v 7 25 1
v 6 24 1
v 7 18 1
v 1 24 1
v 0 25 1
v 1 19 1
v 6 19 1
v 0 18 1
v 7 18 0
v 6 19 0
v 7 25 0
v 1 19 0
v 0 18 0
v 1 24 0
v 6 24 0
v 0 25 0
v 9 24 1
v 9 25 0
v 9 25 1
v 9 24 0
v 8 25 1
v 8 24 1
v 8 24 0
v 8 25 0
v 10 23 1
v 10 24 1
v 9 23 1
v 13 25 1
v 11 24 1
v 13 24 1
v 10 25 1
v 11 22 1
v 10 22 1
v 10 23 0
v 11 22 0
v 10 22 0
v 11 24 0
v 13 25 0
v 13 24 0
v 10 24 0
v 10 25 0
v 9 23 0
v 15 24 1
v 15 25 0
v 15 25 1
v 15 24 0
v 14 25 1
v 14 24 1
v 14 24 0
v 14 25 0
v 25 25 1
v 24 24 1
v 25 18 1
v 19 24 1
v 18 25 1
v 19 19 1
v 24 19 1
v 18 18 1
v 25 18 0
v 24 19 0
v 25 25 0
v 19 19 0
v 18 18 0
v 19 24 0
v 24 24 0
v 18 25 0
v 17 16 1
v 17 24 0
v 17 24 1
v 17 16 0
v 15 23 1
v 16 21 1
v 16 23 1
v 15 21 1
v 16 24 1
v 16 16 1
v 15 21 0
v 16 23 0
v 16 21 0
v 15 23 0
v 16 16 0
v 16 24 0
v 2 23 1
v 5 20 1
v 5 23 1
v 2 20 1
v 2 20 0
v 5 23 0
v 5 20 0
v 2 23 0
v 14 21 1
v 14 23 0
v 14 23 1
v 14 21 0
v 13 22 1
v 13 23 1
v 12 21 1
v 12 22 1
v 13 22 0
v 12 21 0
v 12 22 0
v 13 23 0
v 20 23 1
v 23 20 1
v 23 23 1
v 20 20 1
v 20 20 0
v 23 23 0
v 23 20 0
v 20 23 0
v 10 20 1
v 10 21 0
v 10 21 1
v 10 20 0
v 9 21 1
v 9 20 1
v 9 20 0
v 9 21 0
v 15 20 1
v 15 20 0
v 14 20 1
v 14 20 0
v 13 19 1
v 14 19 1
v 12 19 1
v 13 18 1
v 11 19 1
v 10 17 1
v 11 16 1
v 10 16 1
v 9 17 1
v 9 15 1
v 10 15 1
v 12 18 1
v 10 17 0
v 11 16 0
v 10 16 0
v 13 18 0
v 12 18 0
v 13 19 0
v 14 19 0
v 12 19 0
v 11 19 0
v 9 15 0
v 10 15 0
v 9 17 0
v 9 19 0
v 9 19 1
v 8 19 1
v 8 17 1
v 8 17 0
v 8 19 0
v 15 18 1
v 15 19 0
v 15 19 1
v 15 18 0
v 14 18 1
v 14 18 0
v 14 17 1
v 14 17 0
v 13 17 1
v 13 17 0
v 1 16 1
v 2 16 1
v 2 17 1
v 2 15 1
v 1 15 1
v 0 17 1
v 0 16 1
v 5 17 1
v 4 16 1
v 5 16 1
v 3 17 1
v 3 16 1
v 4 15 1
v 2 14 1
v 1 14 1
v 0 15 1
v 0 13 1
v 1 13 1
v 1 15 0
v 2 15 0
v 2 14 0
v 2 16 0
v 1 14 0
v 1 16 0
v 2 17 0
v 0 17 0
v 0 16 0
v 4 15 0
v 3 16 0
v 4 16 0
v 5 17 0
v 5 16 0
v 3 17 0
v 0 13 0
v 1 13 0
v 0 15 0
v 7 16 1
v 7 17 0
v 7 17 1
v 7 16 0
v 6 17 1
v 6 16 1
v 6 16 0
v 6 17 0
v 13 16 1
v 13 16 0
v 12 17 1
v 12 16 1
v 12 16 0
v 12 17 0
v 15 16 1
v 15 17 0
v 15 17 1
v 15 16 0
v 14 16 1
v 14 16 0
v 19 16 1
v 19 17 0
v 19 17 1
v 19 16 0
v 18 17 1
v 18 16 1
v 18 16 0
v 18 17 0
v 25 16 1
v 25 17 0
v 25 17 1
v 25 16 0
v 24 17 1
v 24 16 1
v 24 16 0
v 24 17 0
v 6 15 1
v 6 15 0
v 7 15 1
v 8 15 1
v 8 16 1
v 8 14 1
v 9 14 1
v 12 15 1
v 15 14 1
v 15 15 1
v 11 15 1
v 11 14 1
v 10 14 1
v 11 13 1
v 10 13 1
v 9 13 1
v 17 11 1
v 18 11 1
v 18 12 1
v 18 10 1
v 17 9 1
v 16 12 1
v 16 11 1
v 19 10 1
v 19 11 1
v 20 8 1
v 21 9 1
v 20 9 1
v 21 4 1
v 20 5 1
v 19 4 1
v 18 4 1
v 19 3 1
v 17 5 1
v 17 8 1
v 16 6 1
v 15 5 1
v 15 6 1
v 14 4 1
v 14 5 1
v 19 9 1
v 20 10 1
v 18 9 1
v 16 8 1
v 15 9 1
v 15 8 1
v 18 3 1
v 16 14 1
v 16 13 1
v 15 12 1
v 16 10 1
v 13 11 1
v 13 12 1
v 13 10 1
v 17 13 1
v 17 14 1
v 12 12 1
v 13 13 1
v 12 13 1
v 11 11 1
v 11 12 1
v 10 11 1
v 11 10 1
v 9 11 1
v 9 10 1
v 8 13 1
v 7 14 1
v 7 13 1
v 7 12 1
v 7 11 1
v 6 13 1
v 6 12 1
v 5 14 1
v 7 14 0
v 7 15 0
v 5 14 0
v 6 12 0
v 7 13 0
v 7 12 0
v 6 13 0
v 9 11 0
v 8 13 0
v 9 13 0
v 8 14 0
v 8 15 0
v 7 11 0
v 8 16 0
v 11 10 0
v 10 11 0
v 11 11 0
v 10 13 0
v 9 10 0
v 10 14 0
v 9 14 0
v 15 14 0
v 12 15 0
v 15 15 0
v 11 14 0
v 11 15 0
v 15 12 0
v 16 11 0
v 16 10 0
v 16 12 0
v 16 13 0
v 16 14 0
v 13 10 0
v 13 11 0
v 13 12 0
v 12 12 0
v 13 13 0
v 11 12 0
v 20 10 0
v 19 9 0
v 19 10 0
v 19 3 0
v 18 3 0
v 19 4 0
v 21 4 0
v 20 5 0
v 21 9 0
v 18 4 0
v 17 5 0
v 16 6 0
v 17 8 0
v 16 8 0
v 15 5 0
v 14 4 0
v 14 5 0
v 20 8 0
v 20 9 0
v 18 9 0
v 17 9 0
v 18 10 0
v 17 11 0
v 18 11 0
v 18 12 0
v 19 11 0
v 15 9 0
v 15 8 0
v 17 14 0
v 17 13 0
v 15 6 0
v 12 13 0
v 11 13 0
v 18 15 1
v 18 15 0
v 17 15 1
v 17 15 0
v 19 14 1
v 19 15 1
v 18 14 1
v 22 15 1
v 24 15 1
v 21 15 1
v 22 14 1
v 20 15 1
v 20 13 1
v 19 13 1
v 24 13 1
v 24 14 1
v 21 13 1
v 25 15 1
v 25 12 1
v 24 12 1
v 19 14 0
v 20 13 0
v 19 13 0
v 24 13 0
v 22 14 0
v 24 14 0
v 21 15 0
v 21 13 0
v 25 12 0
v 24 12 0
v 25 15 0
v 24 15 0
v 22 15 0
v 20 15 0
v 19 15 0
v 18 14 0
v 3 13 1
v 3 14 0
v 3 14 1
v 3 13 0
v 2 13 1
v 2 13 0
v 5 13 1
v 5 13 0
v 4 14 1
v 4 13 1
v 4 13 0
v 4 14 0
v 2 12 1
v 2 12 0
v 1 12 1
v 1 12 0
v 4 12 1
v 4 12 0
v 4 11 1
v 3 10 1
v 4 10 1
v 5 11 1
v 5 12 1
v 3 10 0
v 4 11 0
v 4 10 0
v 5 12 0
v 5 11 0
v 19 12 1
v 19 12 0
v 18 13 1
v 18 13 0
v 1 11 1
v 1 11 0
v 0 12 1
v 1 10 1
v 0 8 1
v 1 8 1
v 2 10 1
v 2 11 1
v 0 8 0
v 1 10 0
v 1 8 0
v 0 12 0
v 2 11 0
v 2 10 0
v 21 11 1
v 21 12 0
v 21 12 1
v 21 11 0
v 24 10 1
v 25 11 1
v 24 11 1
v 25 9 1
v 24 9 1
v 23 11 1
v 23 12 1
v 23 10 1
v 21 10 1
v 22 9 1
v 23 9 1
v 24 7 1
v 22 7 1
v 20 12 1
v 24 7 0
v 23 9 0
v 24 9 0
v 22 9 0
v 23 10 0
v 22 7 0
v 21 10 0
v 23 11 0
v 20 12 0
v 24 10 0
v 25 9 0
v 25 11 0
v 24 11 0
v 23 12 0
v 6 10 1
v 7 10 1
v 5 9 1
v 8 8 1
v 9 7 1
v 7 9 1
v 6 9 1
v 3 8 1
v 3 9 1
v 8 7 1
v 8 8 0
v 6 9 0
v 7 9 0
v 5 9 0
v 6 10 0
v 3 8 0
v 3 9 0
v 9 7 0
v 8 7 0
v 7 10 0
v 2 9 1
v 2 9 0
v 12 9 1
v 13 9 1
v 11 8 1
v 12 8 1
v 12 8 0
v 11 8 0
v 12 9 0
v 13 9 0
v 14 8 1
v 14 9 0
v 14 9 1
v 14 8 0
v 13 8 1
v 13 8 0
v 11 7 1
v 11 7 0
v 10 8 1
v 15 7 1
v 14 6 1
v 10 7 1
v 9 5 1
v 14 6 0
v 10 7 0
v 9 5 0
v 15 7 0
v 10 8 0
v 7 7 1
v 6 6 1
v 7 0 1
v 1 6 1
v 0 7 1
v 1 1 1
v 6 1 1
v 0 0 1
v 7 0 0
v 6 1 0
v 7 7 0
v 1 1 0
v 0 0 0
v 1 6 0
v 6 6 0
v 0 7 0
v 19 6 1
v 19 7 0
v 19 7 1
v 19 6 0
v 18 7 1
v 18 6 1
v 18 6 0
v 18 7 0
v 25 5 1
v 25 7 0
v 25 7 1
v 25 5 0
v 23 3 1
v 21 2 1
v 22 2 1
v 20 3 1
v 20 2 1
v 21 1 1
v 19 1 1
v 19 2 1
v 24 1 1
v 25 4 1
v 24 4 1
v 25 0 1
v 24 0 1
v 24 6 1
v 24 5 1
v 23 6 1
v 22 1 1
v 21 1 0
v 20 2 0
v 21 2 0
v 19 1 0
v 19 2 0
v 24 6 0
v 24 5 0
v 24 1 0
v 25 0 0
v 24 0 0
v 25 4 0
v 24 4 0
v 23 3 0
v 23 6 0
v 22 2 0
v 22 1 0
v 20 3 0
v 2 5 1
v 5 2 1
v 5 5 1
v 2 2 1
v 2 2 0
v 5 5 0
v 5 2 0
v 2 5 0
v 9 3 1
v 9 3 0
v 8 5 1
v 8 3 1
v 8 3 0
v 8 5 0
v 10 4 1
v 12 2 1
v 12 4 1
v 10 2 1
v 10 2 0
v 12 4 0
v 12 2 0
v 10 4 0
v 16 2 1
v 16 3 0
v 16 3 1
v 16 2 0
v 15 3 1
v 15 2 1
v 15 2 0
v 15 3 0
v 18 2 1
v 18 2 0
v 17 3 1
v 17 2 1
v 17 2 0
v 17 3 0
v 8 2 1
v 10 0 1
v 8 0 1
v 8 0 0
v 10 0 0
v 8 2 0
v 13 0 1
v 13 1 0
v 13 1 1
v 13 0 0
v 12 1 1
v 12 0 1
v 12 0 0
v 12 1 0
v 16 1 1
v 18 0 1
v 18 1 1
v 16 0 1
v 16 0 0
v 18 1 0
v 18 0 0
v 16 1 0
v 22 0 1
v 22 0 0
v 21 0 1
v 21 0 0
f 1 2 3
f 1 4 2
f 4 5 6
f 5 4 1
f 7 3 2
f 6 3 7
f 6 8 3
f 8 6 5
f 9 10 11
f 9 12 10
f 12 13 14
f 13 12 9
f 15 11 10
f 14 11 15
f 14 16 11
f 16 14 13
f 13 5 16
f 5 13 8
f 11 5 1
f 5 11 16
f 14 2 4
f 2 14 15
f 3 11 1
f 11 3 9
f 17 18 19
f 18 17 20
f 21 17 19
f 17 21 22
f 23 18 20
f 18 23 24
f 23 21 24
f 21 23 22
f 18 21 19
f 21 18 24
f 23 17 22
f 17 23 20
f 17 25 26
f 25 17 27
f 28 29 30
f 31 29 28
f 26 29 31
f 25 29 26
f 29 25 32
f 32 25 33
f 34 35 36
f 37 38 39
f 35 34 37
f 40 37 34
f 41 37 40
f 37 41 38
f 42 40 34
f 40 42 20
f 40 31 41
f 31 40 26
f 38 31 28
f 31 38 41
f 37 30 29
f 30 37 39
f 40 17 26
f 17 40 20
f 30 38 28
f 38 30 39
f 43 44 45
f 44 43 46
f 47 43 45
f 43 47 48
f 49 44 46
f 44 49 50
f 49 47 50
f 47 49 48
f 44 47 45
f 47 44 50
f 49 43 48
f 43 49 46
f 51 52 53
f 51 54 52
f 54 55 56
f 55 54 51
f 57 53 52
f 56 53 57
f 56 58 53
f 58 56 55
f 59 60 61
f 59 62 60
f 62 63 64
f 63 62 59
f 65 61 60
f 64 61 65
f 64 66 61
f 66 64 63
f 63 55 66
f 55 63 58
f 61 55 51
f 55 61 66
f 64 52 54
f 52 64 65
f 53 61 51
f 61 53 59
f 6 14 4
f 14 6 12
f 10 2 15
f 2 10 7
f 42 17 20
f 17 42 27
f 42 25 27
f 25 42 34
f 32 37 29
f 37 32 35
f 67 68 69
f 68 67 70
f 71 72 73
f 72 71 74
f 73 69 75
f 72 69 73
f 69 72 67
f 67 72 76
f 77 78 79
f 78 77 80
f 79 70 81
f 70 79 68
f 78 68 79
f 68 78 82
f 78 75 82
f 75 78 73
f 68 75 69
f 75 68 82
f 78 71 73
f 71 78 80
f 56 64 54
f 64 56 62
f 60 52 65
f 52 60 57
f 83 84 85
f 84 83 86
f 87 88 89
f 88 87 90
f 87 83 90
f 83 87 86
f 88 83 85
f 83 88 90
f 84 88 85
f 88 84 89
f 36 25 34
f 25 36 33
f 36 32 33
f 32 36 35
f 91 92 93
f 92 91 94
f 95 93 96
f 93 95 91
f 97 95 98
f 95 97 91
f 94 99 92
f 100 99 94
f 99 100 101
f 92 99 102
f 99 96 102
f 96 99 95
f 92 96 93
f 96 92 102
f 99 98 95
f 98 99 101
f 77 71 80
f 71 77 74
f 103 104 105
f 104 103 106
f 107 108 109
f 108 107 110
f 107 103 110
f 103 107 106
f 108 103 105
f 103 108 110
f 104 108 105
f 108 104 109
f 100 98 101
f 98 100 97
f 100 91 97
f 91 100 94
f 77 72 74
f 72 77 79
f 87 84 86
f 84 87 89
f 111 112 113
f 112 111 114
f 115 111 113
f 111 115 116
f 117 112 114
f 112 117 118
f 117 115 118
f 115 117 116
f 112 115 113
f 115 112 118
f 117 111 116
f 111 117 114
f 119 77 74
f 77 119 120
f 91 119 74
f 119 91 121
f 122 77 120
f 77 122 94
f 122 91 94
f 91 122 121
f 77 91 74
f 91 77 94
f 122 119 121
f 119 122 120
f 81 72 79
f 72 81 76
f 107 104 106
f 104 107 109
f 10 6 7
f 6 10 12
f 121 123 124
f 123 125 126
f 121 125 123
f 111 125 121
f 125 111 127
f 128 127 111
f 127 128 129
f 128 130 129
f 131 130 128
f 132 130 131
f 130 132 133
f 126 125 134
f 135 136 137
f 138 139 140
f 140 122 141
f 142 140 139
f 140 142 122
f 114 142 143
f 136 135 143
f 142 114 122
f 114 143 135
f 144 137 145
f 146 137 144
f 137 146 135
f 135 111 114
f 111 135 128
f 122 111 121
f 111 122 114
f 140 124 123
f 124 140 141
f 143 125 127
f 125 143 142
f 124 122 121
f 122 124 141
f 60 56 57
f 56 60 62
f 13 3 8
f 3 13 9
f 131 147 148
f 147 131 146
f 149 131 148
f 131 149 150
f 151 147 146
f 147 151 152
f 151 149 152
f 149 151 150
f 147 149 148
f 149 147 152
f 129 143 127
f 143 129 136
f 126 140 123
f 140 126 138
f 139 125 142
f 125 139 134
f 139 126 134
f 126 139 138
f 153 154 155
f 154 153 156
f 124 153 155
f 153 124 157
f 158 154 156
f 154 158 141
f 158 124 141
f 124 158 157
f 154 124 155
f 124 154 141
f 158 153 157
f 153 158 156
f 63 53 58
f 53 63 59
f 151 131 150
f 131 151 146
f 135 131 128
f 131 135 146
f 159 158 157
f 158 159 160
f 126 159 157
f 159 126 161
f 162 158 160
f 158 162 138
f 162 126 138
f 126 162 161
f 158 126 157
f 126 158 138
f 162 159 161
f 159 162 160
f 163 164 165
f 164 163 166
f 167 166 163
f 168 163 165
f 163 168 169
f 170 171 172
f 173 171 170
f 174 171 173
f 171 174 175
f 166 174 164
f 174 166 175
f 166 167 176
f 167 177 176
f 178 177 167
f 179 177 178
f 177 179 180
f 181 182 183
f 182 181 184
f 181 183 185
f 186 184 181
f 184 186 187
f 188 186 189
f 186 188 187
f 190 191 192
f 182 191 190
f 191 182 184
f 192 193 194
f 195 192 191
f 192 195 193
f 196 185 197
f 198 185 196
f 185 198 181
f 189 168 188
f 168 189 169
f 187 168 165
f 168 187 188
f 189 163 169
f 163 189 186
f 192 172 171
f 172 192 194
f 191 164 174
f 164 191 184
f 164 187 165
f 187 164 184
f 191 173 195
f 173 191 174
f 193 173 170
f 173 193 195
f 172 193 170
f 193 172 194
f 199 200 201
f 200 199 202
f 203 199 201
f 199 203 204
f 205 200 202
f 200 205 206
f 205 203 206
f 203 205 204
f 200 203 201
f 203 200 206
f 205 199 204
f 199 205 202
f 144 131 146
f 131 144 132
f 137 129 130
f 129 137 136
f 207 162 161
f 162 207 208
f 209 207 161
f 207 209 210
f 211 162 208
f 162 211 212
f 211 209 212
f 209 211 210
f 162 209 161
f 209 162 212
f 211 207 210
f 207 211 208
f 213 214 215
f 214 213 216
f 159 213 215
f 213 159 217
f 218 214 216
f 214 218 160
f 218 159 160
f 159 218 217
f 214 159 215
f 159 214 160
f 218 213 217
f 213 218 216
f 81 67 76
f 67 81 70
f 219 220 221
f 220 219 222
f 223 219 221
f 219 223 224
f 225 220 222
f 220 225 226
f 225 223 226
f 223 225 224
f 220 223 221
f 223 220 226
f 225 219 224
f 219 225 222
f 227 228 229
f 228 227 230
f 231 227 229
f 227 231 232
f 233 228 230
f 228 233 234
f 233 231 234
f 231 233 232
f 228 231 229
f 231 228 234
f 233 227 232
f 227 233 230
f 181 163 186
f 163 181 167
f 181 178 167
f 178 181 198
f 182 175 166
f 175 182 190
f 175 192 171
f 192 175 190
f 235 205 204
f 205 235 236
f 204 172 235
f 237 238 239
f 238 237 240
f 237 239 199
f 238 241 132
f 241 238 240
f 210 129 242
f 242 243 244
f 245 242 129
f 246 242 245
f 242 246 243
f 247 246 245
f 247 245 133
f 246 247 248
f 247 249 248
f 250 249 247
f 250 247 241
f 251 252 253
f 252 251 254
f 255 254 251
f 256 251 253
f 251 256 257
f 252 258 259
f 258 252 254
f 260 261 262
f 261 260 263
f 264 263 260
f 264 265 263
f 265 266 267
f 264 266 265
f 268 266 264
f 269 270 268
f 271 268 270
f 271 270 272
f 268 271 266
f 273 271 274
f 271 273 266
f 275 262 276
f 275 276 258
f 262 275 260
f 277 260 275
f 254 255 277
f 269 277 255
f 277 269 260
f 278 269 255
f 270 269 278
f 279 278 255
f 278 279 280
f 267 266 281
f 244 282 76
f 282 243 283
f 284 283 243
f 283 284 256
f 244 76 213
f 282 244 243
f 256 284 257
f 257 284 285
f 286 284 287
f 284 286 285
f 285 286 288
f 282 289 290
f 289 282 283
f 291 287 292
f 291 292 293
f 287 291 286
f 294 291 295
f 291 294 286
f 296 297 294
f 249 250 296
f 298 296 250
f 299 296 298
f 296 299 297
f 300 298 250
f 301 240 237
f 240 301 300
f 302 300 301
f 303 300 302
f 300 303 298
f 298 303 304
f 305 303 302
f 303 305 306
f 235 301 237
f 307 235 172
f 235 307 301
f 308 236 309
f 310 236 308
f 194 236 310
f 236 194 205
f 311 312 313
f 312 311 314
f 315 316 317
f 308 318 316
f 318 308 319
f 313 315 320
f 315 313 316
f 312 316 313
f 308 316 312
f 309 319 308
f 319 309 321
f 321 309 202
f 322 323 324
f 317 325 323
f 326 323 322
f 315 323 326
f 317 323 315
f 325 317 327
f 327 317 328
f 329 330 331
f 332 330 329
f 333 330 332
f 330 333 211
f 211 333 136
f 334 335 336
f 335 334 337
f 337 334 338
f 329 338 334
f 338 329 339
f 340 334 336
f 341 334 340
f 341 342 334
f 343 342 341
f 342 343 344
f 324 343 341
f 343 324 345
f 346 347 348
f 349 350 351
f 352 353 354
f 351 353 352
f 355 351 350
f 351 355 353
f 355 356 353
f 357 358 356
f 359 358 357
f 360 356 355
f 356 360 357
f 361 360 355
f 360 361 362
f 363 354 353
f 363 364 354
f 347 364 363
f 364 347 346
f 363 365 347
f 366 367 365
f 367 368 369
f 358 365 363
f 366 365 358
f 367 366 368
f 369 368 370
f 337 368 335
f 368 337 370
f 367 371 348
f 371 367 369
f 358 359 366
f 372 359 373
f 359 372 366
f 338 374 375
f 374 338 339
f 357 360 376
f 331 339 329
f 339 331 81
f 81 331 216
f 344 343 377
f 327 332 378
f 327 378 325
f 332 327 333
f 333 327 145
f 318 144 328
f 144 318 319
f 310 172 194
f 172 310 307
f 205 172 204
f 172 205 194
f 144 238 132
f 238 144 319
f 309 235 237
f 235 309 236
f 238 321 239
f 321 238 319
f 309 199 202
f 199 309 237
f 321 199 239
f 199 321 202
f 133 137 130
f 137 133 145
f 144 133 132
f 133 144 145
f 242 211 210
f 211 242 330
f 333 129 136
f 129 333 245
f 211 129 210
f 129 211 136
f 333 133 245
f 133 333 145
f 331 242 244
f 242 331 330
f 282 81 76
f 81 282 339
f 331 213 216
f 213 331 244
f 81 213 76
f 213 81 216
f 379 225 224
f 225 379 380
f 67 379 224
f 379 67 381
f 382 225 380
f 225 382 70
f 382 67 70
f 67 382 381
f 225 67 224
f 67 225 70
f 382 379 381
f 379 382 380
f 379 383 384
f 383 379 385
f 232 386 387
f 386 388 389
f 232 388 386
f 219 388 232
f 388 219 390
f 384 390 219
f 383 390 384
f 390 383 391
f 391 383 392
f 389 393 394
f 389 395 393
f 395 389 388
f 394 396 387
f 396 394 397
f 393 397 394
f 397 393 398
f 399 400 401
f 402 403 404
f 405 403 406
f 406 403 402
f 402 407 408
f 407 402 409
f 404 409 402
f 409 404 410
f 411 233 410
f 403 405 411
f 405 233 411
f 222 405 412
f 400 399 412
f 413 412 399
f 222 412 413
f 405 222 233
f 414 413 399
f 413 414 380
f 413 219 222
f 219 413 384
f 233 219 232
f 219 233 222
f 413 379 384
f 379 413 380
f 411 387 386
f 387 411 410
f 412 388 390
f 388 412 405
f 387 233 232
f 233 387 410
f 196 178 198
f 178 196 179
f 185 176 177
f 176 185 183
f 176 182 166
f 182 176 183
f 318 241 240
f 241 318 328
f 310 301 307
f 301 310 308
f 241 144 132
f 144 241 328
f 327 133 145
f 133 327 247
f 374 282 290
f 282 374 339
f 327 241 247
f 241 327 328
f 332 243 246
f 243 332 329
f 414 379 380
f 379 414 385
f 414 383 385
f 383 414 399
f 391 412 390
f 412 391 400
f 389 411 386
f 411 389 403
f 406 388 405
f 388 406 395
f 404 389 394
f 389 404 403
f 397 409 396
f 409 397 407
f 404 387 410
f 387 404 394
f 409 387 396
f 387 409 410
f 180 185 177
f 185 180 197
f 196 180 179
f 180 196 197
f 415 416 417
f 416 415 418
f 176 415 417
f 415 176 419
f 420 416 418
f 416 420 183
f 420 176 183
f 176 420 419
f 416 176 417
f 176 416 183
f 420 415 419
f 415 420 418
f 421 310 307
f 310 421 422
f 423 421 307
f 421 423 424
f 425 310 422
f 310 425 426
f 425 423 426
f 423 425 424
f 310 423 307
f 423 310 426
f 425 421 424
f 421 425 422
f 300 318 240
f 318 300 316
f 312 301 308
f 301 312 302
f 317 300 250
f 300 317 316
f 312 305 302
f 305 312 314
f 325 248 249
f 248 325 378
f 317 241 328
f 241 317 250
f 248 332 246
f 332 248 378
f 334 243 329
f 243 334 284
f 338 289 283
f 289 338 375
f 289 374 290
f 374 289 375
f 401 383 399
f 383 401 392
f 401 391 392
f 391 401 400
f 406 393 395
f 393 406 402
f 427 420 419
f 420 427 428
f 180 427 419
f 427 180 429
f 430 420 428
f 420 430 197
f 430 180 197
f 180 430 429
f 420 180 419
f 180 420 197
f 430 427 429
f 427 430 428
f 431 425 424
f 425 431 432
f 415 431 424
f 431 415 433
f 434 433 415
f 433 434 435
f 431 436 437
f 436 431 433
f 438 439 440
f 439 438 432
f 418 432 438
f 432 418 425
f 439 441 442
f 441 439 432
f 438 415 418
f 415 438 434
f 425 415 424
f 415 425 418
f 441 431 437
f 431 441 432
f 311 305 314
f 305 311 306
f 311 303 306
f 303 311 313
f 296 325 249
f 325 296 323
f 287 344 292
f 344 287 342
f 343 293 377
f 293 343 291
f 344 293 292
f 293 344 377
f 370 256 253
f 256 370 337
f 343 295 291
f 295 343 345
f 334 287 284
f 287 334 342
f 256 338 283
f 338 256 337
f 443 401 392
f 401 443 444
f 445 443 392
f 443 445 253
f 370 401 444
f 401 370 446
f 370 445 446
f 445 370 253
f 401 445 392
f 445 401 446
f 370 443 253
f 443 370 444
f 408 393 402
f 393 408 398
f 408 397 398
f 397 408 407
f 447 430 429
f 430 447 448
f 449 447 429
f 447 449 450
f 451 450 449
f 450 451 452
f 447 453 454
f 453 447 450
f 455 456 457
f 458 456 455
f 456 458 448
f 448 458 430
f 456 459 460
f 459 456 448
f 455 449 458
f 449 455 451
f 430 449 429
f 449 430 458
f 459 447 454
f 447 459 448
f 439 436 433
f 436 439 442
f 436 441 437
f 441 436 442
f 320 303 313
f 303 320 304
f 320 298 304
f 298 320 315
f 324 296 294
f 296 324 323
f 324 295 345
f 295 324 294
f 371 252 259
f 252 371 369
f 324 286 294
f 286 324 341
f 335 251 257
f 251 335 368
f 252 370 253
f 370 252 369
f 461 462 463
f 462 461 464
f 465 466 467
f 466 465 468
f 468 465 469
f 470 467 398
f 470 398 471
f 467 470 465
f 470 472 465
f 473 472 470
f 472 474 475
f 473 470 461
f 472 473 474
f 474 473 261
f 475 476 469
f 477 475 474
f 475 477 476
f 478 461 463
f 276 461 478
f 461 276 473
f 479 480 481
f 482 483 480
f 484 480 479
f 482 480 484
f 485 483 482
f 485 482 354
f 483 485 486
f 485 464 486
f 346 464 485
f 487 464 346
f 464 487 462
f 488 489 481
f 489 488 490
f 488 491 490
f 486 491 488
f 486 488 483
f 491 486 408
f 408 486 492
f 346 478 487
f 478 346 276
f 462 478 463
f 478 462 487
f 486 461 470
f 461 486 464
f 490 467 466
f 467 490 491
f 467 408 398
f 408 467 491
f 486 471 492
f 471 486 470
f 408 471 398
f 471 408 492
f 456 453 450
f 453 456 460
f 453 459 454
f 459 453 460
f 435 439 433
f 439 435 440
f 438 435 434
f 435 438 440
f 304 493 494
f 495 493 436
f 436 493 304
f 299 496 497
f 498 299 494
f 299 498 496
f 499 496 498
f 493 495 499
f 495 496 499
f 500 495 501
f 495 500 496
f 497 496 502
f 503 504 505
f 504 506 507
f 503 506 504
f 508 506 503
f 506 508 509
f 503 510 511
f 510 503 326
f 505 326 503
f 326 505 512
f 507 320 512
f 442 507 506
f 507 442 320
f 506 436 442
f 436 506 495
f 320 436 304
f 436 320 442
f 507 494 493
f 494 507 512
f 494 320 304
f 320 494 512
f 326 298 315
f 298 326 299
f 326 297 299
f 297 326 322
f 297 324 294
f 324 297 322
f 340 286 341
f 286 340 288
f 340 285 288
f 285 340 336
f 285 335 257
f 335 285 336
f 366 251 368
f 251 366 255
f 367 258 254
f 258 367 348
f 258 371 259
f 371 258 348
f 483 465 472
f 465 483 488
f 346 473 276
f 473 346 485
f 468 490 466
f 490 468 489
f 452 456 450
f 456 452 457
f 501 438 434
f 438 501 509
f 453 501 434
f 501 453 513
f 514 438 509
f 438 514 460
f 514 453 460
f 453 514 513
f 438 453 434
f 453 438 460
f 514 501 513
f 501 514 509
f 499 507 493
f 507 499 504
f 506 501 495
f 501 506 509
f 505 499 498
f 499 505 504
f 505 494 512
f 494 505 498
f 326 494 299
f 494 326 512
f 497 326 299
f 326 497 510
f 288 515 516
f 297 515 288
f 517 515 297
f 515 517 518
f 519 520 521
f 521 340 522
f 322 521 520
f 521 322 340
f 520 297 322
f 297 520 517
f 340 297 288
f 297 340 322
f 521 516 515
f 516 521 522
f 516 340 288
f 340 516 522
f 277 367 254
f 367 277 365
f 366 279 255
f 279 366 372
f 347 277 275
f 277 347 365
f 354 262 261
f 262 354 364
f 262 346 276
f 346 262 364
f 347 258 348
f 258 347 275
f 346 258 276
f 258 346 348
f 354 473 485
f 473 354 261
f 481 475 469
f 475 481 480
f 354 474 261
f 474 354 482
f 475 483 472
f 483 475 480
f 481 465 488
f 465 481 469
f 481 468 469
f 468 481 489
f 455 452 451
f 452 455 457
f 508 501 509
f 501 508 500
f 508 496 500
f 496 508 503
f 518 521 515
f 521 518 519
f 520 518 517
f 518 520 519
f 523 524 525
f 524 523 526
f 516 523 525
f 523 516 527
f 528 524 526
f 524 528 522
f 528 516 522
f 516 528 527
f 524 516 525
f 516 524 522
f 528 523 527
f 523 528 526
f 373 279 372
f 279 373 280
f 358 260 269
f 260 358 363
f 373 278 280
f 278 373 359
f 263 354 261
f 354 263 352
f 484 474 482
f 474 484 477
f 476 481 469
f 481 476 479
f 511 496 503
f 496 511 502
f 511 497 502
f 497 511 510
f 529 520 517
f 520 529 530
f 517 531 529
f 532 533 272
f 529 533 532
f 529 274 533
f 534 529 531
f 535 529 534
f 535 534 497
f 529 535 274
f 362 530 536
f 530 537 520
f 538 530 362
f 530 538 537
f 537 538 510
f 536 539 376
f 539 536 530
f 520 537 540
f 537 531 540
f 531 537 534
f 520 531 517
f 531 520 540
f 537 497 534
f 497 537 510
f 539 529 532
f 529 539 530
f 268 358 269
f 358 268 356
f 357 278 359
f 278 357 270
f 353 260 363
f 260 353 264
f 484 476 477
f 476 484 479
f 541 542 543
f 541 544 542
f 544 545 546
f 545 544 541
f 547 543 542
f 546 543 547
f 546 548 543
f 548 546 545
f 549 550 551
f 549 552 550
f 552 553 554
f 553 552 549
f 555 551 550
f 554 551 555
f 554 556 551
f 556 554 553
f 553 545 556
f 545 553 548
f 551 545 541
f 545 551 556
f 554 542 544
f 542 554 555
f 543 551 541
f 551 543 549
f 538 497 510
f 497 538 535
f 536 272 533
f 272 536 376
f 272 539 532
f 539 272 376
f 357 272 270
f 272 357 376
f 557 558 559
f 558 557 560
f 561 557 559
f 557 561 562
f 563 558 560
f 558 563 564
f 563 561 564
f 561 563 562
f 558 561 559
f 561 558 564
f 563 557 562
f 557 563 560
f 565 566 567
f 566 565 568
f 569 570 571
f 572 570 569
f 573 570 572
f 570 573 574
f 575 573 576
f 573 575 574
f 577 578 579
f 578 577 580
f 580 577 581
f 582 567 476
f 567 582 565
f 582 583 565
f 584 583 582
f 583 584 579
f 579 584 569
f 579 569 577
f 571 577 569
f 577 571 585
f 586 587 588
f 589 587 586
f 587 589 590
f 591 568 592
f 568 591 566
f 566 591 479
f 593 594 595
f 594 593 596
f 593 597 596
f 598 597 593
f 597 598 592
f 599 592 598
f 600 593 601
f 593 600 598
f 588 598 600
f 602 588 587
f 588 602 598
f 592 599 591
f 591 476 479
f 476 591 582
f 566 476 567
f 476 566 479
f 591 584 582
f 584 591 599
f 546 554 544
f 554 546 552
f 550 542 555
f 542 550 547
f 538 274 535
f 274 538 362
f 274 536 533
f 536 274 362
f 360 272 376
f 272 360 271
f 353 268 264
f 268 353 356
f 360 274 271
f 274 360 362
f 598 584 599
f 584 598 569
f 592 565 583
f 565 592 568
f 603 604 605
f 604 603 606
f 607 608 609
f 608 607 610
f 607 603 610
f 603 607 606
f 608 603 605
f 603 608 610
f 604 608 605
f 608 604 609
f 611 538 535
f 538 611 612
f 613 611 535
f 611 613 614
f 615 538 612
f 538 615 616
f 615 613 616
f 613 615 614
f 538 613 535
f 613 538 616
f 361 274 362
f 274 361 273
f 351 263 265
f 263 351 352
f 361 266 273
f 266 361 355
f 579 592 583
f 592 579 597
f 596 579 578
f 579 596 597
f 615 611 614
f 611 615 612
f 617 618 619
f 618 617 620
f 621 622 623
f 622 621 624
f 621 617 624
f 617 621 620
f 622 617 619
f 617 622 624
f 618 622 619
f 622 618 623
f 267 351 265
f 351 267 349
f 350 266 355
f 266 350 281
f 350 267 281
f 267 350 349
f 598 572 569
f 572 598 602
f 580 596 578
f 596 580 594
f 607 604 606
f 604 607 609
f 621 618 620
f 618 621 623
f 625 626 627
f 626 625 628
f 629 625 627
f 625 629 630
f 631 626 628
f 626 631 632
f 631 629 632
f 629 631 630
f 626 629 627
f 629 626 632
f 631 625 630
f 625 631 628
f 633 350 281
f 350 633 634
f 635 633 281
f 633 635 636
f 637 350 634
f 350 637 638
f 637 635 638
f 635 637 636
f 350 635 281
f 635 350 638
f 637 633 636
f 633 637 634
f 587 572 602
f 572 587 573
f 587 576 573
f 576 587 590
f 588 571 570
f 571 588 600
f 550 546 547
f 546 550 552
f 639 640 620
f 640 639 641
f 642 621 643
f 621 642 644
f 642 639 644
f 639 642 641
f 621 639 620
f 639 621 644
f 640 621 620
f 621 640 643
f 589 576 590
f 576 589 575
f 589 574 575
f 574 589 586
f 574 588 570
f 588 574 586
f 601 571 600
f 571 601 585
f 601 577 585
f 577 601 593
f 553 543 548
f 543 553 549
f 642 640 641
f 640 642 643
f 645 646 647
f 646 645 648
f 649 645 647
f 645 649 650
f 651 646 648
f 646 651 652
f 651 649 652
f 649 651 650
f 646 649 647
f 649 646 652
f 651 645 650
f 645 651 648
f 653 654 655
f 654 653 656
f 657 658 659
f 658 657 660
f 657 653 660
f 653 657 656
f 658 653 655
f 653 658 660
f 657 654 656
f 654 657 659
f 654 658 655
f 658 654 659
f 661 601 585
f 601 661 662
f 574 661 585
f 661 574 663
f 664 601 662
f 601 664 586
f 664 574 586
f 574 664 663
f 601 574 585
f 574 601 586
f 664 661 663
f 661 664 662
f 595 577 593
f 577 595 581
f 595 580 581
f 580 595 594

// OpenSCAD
// QR code data for "https://www.berlincreators.de" (25 x 25)
// Generated by Altair's OpenSCAD QR Code Generator
// https://ridercz.github.io/OpenSCAD-QR/
qr_data = [[1,1,1,1,1,1,1,0,1,0,1,1,1,0,1,0,0,0,1,1,1,1,1,1,1],
           [1,0,0,0,0,0,1,0,0,1,1,0,0,0,0,0,1,0,1,0,0,0,0,0,1],
           [1,0,1,1,1,0,1,0,0,0,1,0,0,1,0,1,1,0,1,0,1,1,1,0,1],
           [1,0,1,1,1,0,1,0,0,0,0,0,1,1,0,1,1,0,1,0,1,1,1,0,1],
           [1,0,1,1,1,0,1,0,0,1,0,0,0,0,1,0,1,0,1,0,1,1,1,0,1],
           [1,0,0,0,0,0,1,0,0,0,1,1,1,1,0,0,1,0,1,0,0,0,0,0,1],
           [1,1,1,1,1,1,1,0,1,0,1,0,1,0,1,0,1,0,1,1,1,1,1,1,1],
           [0,0,0,0,0,0,0,0,1,0,1,0,0,1,0,0,1,0,0,0,0,0,0,0,0],
           [1,1,0,1,1,0,1,0,0,1,1,0,1,0,1,0,1,0,1,0,0,0,0,0,1],
           [0,1,1,1,0,1,0,1,0,1,0,1,0,0,0,1,0,1,0,1,1,1,1,1,0],
           [1,1,0,0,0,1,1,1,1,0,1,1,1,1,1,1,0,0,1,1,0,1,0,0,1],
           [1,0,1,0,1,0,0,1,0,1,1,0,0,0,0,1,1,0,0,1,0,1,1,1,1],
           [0,1,0,1,0,0,1,1,1,1,0,0,1,0,0,1,0,0,1,0,0,0,0,0,1],
           [1,0,0,1,1,0,0,1,1,1,0,1,1,1,1,1,1,1,0,0,1,0,0,1,0],
           [1,1,0,1,0,1,1,0,0,1,1,0,0,1,1,1,0,1,1,0,1,1,1,1,1],
           [1,0,1,0,0,1,0,1,1,0,0,1,1,0,0,0,0,1,0,1,0,1,1,0,1],
           [1,0,0,1,1,1,1,1,1,0,0,1,0,1,0,1,1,1,1,1,1,0,1,1,0],
           [0,0,0,0,0,0,0,0,1,0,1,0,0,0,0,0,1,0,0,0,1,0,1,1,0],
           [1,1,1,1,1,1,1,0,0,1,1,1,1,1,1,0,1,0,1,0,1,0,0,0,1],
           [1,0,0,0,0,0,1,0,0,1,1,1,1,1,0,1,1,0,0,0,1,0,0,1,1],
           [1,0,1,1,1,0,1,0,1,0,0,0,0,0,1,1,1,1,1,1,1,0,0,1,0],
           [1,0,1,1,1,0,1,0,1,0,1,1,0,0,0,0,0,0,1,0,0,0,0,1,1],
           [1,0,1,1,1,0,1,0,0,0,1,1,0,0,0,1,0,1,0,0,1,1,1,1,1],
           [1,0,0,0,0,0,1,0,1,1,0,0,0,0,0,0,0,0,0,1,1,0,1,1,1],
           [1,1,1,1,1,1,1,0,1,1,0,0,1,0,0,0,1,1,0,0,0,1,0,0,1]];

// Render QR code with default settings (module 1x1x1)
qr_render(qr_data);

// QR code rendering method
module qr_render(data=qr_data, module_size = 1, height = 1) {
    maxmod = len(data) - 1;
    union() {
        for(r = [0 : maxmod]) {
            for(c = [0 : maxmod]) {
                if(data[r][c] == 1){
                    xo = c * module_size;
                    yo = (maxmod - r) * module_size;
                    translate([xo, yo, 0]) cube([module_size, module_size, height]);
                }
            }
        }
    }
}
